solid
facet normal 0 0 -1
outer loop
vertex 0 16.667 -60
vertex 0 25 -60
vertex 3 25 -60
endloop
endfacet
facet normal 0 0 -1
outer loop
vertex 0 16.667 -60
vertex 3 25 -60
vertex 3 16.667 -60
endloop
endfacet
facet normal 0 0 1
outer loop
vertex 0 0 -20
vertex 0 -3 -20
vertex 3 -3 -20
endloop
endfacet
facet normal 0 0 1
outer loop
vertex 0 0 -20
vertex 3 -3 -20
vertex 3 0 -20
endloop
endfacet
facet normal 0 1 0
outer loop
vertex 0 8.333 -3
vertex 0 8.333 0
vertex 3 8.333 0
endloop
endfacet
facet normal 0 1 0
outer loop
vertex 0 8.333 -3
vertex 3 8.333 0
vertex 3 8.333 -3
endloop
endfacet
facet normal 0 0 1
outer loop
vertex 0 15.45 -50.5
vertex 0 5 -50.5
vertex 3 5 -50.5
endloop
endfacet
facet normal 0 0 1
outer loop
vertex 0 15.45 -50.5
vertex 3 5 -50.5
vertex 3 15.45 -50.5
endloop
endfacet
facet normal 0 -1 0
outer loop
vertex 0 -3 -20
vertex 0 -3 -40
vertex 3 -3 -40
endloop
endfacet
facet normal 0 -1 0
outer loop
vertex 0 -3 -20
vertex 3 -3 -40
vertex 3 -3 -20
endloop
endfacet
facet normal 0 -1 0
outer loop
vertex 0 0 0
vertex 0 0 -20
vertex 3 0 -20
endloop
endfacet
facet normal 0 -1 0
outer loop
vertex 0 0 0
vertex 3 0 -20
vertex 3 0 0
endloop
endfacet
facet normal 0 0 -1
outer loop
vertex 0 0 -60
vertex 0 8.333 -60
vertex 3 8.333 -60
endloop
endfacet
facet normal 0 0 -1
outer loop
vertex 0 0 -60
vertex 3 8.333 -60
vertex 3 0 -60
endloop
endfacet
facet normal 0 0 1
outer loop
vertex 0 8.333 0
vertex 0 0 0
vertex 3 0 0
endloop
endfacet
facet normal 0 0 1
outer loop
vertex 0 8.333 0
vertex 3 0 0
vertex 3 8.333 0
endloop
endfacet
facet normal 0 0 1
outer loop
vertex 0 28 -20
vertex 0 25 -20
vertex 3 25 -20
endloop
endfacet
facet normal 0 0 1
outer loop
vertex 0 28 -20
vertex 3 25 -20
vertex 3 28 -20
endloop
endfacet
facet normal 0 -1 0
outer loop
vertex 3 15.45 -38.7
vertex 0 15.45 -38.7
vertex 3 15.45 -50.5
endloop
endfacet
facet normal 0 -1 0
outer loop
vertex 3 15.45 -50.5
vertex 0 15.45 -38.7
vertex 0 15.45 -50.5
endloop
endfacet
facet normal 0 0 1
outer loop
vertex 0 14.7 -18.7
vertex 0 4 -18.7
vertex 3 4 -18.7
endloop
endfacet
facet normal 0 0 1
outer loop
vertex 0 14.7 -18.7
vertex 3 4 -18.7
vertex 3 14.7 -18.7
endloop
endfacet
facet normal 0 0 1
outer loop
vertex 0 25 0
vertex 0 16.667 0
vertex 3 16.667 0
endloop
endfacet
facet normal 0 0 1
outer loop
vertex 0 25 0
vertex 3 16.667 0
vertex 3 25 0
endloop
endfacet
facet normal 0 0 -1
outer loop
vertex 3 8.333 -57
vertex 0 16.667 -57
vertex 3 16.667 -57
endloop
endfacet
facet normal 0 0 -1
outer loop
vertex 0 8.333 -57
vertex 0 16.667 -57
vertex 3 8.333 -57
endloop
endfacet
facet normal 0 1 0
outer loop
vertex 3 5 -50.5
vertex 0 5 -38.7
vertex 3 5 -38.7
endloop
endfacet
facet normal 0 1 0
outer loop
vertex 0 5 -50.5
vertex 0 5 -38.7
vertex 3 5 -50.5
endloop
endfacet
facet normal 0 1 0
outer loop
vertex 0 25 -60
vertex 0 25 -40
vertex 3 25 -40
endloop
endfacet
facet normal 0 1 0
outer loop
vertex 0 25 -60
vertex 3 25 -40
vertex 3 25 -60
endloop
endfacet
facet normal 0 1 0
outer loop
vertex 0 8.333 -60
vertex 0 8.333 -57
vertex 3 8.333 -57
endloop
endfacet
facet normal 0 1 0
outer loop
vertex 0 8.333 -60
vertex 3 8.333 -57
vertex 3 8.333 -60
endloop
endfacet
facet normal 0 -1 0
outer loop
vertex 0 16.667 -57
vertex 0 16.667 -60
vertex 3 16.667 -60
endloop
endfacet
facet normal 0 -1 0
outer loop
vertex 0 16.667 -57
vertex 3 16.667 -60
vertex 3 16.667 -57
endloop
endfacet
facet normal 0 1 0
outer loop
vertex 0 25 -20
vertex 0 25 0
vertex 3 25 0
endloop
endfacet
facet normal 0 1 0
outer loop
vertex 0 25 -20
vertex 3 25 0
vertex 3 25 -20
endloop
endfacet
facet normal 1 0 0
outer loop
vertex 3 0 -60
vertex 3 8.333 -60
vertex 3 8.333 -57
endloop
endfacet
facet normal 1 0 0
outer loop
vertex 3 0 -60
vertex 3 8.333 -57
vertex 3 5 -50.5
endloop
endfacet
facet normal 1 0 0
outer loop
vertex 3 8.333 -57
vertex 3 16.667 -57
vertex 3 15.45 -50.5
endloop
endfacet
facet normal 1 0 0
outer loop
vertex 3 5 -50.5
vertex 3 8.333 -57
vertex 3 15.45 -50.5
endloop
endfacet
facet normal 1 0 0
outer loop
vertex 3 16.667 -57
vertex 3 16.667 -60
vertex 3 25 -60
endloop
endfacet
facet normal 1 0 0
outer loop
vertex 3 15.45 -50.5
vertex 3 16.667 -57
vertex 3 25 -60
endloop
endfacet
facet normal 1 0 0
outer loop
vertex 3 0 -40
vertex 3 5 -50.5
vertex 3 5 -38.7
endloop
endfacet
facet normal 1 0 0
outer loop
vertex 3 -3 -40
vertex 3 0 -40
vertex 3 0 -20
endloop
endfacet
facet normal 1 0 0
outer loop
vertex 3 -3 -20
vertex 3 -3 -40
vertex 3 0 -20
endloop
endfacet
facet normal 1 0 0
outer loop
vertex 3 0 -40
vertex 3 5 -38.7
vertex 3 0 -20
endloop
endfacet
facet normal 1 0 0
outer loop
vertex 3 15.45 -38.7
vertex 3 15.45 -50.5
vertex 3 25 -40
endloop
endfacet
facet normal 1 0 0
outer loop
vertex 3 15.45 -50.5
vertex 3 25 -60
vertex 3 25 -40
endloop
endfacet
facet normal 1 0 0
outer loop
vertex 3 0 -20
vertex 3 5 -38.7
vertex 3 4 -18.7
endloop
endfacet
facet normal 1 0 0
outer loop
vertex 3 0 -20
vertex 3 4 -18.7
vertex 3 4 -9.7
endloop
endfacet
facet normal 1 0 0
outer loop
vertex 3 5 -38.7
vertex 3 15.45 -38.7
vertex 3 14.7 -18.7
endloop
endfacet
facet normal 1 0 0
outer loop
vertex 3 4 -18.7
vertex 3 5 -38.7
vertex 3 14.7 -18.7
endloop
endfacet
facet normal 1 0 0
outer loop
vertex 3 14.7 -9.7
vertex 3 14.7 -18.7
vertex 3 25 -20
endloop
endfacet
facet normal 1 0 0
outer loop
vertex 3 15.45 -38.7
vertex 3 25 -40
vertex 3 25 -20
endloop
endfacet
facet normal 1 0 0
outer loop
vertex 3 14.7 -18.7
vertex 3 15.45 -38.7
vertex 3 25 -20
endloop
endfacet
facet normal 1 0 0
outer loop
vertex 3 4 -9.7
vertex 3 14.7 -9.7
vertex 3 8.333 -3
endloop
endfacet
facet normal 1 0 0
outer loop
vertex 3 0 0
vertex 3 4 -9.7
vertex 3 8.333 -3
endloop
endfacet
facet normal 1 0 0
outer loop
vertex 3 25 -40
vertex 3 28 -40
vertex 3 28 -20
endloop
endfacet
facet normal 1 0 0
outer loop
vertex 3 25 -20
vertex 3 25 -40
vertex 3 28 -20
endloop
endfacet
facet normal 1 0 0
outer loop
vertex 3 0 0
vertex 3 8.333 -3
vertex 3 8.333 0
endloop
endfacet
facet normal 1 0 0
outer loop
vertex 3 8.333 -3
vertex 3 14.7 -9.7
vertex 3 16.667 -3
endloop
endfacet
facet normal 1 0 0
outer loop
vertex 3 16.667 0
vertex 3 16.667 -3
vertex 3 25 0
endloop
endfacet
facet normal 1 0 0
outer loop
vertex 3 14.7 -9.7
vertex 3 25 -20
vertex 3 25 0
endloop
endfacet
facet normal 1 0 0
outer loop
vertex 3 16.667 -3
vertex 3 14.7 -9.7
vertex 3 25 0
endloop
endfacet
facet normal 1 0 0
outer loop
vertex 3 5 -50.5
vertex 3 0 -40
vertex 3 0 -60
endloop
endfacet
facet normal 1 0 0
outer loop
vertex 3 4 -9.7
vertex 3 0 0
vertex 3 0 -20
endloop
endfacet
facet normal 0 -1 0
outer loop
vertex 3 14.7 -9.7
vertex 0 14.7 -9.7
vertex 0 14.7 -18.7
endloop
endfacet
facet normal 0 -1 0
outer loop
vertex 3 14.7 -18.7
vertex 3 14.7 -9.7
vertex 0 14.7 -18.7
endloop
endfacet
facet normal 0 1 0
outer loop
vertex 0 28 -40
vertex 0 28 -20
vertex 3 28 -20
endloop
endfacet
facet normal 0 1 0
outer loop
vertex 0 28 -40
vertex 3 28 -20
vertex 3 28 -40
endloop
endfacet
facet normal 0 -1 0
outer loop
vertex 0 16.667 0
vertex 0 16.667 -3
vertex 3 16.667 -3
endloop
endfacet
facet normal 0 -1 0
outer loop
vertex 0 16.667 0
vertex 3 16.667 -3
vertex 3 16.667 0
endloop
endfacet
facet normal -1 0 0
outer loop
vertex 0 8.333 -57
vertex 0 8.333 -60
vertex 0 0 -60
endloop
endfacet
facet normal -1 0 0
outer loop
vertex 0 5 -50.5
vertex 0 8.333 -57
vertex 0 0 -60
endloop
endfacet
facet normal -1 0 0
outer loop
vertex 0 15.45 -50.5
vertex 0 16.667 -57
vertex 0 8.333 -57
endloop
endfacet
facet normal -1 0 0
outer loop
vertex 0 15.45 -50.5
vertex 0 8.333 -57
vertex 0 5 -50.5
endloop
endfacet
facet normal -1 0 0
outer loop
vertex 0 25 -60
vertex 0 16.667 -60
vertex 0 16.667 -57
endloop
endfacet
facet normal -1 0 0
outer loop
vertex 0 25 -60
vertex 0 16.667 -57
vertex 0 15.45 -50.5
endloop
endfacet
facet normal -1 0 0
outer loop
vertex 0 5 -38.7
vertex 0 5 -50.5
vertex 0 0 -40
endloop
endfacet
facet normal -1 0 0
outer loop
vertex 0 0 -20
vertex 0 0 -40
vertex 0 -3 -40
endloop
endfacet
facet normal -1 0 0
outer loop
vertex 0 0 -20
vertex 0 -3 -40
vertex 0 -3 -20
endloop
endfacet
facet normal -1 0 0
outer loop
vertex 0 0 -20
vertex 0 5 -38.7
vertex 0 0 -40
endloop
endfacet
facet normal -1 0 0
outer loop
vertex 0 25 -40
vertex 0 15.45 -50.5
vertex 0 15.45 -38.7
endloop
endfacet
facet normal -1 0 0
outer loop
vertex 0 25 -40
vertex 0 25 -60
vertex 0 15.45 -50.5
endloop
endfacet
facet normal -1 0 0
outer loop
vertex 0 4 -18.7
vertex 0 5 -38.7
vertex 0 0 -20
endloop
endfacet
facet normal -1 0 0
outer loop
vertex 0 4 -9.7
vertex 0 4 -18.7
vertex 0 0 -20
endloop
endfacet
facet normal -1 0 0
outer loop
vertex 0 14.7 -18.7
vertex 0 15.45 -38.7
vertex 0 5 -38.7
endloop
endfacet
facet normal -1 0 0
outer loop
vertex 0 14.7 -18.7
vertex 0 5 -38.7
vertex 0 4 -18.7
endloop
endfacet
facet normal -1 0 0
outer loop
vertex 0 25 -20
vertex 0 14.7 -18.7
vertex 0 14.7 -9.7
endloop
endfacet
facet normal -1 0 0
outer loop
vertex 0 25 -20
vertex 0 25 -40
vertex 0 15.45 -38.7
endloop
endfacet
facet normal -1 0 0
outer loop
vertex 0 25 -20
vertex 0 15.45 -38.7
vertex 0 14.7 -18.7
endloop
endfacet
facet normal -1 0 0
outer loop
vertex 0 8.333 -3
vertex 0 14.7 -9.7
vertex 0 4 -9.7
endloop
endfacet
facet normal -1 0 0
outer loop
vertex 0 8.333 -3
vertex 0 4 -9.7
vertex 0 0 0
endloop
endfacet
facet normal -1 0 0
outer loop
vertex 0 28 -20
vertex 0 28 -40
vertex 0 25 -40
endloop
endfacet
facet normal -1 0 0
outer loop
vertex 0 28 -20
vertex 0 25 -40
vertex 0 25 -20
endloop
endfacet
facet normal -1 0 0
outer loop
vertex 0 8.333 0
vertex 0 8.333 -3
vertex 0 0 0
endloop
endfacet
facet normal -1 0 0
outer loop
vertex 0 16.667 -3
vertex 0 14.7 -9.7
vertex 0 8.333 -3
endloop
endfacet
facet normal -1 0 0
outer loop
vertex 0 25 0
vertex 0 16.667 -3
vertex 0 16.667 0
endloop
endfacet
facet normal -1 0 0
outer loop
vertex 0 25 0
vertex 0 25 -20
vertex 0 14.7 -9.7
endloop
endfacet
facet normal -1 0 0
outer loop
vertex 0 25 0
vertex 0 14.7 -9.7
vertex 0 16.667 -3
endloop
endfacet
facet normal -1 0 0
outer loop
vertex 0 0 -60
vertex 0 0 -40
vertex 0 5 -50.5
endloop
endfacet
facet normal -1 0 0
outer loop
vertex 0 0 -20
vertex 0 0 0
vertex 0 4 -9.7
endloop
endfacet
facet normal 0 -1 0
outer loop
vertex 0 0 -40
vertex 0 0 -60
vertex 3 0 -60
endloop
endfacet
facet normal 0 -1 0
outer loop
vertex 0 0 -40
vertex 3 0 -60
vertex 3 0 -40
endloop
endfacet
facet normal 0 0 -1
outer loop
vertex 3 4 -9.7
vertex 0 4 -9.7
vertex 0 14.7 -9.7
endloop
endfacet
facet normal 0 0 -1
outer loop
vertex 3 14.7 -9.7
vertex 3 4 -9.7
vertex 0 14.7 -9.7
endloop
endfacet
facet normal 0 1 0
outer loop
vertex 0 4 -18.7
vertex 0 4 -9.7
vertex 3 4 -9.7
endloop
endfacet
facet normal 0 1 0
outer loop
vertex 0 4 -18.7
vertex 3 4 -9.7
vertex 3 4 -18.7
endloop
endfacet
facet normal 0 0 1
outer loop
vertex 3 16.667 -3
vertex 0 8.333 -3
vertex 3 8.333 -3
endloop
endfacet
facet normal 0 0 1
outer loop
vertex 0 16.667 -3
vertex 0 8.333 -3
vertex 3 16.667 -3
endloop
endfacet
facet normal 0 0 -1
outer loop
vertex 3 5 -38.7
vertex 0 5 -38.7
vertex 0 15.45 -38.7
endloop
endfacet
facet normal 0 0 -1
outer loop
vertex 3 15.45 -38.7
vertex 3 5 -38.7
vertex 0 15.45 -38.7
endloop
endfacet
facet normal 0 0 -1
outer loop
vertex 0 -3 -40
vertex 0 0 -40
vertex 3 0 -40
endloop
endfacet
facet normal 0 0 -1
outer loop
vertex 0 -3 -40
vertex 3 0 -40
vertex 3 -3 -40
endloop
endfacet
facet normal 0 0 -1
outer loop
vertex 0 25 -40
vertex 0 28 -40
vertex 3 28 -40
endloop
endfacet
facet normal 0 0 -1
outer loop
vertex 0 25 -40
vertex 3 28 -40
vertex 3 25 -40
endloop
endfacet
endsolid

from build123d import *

# Parameters (mm, degrees)
SIDES_W              = 11.8
SIDES_H              = 10.45
SIDES_W_2            = 9
SIDES_H_2            = 10.7
SIDES_EXTRUDED_DEPTH = 3


with BuildPart() as part:
    # Sides → Sides Extruded (new body)
    with BuildSketch(Plane(origin=(0, 0, 0), x_dir=(0, 0, -1), z_dir=(1, 0, 0))):
        Polygon((0, 16.66666666), (0, 25), (20, 25), (20, 28), (40, 28), (40, 25), (60, 25), (60, 16.66666666), (57, 16.66666666), (57, 8.33333333), (60, 8.33333333), (60, 0), (40, 0), (40, -3), (20, -3), (20, 0), (0, 0), (0, 8.33333333), (3, 8.33333333), (3, 16.66666666), align=None)
        with Locations((44.6, 10.225)):
            Rectangle(SIDES_W, SIDES_H, mode=Mode.SUBTRACT)
        with Locations((14.2, 9.35)):
            Rectangle(SIDES_W_2, SIDES_H_2, mode=Mode.SUBTRACT)
    extrude(amount=SIDES_EXTRUDED_DEPTH)


solid = part.part
